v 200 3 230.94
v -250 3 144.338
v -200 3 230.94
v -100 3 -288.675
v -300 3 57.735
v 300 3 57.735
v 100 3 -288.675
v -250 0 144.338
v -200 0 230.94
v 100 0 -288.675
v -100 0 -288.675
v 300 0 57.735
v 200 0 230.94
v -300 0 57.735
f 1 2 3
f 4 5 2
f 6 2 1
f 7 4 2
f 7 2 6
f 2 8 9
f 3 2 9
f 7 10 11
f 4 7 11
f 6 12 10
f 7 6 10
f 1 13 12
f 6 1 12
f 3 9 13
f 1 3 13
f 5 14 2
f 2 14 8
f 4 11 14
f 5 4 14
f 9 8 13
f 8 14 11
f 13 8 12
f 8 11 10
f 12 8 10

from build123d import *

# Parameters (mm, degrees)
BOSS_EXTRUDE1_DEPTH = 3


with BuildPart() as part:
    # Sketch2 → Boss-Extrude1 (new body)
    with BuildSketch(Plane(origin=(0, 0, 0), x_dir=(1, 0, 0), z_dir=(0, 1, 0))):
        Polygon((100, 288.675134595), (-100, 288.675134595), (-300, -57.735026919), (-250, -144.337567297), (200, 115.470053838), align=None)
        Polygon((300, -57.735026919), (200, 115.470053838), (-250, -144.337567297), (-200, -230.940107676), (200, -230.940107676), align=None)
    extrude(amount=BOSS_EXTRUDE1_DEPTH)


solid = part.part
